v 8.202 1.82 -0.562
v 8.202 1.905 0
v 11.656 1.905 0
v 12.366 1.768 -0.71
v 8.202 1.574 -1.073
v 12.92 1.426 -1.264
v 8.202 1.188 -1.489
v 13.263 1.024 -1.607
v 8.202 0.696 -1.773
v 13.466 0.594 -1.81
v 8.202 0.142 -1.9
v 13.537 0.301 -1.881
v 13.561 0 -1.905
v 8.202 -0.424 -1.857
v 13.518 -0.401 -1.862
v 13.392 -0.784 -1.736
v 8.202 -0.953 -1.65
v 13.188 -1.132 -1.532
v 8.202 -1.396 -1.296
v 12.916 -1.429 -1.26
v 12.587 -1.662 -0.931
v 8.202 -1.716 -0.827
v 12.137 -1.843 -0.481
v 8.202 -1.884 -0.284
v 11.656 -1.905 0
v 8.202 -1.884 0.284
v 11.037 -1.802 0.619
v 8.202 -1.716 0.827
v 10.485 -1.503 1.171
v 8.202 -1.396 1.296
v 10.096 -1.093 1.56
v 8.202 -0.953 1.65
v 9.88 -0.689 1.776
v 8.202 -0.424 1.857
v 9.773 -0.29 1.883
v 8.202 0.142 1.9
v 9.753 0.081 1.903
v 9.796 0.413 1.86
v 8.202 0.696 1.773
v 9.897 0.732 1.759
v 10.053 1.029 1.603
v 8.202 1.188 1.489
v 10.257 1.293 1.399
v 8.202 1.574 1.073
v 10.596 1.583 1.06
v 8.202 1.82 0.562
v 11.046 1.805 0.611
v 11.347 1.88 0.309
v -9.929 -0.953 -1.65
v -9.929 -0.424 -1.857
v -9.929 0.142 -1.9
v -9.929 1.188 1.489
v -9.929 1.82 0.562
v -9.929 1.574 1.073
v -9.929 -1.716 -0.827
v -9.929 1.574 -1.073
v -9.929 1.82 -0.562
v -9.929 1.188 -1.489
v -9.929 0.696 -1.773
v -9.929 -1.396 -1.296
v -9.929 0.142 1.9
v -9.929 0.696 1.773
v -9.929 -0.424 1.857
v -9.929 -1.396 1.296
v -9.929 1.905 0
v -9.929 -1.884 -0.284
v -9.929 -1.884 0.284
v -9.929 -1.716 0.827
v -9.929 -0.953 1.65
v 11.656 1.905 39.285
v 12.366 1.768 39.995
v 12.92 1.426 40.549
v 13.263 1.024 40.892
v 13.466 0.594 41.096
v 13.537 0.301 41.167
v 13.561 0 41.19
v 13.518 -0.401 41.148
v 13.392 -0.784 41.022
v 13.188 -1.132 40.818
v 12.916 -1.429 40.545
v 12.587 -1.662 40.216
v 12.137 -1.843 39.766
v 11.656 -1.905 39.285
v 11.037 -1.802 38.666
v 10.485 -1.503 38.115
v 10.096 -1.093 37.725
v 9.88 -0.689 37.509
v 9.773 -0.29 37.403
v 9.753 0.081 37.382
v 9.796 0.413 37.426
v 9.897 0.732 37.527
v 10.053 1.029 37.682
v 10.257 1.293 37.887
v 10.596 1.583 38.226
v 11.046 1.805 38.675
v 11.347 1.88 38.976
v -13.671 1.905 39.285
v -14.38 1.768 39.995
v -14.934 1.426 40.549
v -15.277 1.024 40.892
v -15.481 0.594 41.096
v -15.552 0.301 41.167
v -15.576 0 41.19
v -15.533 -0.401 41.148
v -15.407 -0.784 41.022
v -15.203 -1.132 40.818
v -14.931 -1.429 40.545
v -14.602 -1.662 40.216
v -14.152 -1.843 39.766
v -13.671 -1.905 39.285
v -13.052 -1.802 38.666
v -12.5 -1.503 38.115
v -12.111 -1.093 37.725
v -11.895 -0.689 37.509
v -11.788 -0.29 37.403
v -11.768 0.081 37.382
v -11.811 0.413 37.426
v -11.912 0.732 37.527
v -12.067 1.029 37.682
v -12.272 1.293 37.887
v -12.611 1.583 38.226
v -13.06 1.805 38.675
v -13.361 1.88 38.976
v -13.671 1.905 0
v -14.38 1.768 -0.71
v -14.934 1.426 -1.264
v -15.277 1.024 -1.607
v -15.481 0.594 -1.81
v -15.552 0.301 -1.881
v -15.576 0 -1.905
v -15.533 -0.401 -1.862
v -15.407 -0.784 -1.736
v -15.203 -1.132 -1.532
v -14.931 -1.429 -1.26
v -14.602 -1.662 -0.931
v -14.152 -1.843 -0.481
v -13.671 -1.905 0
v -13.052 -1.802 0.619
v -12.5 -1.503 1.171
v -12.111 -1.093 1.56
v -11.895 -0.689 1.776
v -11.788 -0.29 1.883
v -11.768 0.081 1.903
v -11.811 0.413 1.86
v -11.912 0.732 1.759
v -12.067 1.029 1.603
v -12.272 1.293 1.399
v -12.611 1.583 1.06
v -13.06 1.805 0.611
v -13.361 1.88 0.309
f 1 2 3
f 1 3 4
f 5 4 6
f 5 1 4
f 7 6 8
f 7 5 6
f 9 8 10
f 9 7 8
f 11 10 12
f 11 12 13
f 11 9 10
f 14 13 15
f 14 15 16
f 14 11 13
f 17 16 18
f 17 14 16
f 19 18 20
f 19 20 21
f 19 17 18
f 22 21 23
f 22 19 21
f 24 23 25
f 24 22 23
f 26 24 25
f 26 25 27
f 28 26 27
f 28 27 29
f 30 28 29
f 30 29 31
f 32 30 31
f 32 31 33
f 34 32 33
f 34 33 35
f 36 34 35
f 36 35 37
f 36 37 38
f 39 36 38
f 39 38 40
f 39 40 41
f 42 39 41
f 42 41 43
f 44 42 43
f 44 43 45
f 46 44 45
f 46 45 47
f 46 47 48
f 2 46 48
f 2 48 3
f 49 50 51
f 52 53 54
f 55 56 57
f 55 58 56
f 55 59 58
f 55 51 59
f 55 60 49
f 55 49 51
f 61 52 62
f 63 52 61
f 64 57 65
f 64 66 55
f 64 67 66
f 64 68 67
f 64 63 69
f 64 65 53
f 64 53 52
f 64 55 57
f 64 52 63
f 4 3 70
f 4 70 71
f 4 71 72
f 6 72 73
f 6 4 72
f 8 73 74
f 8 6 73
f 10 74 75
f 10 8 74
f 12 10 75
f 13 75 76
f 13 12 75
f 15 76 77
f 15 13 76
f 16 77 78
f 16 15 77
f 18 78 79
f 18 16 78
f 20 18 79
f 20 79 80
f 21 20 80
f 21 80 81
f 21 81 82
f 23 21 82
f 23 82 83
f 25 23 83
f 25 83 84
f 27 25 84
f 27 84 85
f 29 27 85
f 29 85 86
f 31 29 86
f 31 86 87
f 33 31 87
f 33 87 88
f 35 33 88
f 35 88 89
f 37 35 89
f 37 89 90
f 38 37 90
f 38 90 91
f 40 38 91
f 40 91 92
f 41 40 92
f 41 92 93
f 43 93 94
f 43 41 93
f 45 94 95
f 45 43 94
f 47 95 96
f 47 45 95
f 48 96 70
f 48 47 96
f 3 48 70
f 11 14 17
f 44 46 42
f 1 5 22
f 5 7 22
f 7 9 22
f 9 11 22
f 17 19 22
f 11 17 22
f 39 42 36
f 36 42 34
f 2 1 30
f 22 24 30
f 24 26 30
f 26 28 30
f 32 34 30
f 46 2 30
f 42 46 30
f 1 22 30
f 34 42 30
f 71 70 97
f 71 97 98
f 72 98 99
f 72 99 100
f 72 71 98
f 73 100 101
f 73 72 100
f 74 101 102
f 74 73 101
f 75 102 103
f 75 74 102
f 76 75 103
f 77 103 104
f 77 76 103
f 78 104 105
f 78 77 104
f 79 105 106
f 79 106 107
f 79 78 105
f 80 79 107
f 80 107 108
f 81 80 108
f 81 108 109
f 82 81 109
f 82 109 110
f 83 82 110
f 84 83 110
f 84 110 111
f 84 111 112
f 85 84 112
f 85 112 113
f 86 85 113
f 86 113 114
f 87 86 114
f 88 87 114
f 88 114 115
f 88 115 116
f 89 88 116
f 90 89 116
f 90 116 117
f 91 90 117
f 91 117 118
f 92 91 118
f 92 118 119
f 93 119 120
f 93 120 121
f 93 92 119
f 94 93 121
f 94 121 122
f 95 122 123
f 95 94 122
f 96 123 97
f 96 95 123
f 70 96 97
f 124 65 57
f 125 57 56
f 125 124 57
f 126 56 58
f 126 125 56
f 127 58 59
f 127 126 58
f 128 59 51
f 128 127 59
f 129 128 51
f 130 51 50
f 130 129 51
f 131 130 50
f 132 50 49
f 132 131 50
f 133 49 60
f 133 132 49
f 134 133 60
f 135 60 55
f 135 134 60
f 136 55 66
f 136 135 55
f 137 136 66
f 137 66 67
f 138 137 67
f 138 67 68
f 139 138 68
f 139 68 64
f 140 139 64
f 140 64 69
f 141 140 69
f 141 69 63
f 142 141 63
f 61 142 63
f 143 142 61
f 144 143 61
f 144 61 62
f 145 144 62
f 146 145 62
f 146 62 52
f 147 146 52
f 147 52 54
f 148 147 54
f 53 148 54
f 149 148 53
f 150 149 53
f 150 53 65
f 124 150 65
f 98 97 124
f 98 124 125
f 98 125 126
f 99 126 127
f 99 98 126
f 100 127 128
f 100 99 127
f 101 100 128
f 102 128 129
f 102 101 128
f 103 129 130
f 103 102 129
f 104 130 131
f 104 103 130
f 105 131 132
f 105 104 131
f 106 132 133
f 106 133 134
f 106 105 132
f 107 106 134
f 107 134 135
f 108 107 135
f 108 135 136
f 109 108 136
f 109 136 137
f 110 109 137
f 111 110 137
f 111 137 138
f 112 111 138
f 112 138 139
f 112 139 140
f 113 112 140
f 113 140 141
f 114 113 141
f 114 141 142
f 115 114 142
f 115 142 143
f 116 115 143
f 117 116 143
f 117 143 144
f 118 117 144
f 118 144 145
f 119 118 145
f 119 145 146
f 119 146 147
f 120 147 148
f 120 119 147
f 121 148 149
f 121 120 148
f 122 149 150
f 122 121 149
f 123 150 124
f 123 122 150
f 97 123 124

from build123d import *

# Parameters (mm, degrees)
F2_R = 1.905


with BuildPart() as f3:
    # F3: sweep along a path in F0
    with BuildLine(Plane.XZ) as f3_path:
        Line((-9.9292984232, 0), (-13.6707741767, 0))
        Line((-13.6707741767, 0), (-13.6707741767, 39.2854884267))
        Line((-13.6707741767, 39.2854884267), (11.6561325267, 39.2854884267))
        Line((11.6561325267, 39.2854884267), (11.6561325267, 0))
        Line((11.6561325267, 0), (8.2024643198, 0))
    # F2 (on offset) → F3 (sweep)
    with BuildSketch(Plane.YZ.offset(-10.033)):
        Circle(F2_R)
    sweep(path=f3_path.line, transition=Transition.RIGHT)


solid = f3.part
